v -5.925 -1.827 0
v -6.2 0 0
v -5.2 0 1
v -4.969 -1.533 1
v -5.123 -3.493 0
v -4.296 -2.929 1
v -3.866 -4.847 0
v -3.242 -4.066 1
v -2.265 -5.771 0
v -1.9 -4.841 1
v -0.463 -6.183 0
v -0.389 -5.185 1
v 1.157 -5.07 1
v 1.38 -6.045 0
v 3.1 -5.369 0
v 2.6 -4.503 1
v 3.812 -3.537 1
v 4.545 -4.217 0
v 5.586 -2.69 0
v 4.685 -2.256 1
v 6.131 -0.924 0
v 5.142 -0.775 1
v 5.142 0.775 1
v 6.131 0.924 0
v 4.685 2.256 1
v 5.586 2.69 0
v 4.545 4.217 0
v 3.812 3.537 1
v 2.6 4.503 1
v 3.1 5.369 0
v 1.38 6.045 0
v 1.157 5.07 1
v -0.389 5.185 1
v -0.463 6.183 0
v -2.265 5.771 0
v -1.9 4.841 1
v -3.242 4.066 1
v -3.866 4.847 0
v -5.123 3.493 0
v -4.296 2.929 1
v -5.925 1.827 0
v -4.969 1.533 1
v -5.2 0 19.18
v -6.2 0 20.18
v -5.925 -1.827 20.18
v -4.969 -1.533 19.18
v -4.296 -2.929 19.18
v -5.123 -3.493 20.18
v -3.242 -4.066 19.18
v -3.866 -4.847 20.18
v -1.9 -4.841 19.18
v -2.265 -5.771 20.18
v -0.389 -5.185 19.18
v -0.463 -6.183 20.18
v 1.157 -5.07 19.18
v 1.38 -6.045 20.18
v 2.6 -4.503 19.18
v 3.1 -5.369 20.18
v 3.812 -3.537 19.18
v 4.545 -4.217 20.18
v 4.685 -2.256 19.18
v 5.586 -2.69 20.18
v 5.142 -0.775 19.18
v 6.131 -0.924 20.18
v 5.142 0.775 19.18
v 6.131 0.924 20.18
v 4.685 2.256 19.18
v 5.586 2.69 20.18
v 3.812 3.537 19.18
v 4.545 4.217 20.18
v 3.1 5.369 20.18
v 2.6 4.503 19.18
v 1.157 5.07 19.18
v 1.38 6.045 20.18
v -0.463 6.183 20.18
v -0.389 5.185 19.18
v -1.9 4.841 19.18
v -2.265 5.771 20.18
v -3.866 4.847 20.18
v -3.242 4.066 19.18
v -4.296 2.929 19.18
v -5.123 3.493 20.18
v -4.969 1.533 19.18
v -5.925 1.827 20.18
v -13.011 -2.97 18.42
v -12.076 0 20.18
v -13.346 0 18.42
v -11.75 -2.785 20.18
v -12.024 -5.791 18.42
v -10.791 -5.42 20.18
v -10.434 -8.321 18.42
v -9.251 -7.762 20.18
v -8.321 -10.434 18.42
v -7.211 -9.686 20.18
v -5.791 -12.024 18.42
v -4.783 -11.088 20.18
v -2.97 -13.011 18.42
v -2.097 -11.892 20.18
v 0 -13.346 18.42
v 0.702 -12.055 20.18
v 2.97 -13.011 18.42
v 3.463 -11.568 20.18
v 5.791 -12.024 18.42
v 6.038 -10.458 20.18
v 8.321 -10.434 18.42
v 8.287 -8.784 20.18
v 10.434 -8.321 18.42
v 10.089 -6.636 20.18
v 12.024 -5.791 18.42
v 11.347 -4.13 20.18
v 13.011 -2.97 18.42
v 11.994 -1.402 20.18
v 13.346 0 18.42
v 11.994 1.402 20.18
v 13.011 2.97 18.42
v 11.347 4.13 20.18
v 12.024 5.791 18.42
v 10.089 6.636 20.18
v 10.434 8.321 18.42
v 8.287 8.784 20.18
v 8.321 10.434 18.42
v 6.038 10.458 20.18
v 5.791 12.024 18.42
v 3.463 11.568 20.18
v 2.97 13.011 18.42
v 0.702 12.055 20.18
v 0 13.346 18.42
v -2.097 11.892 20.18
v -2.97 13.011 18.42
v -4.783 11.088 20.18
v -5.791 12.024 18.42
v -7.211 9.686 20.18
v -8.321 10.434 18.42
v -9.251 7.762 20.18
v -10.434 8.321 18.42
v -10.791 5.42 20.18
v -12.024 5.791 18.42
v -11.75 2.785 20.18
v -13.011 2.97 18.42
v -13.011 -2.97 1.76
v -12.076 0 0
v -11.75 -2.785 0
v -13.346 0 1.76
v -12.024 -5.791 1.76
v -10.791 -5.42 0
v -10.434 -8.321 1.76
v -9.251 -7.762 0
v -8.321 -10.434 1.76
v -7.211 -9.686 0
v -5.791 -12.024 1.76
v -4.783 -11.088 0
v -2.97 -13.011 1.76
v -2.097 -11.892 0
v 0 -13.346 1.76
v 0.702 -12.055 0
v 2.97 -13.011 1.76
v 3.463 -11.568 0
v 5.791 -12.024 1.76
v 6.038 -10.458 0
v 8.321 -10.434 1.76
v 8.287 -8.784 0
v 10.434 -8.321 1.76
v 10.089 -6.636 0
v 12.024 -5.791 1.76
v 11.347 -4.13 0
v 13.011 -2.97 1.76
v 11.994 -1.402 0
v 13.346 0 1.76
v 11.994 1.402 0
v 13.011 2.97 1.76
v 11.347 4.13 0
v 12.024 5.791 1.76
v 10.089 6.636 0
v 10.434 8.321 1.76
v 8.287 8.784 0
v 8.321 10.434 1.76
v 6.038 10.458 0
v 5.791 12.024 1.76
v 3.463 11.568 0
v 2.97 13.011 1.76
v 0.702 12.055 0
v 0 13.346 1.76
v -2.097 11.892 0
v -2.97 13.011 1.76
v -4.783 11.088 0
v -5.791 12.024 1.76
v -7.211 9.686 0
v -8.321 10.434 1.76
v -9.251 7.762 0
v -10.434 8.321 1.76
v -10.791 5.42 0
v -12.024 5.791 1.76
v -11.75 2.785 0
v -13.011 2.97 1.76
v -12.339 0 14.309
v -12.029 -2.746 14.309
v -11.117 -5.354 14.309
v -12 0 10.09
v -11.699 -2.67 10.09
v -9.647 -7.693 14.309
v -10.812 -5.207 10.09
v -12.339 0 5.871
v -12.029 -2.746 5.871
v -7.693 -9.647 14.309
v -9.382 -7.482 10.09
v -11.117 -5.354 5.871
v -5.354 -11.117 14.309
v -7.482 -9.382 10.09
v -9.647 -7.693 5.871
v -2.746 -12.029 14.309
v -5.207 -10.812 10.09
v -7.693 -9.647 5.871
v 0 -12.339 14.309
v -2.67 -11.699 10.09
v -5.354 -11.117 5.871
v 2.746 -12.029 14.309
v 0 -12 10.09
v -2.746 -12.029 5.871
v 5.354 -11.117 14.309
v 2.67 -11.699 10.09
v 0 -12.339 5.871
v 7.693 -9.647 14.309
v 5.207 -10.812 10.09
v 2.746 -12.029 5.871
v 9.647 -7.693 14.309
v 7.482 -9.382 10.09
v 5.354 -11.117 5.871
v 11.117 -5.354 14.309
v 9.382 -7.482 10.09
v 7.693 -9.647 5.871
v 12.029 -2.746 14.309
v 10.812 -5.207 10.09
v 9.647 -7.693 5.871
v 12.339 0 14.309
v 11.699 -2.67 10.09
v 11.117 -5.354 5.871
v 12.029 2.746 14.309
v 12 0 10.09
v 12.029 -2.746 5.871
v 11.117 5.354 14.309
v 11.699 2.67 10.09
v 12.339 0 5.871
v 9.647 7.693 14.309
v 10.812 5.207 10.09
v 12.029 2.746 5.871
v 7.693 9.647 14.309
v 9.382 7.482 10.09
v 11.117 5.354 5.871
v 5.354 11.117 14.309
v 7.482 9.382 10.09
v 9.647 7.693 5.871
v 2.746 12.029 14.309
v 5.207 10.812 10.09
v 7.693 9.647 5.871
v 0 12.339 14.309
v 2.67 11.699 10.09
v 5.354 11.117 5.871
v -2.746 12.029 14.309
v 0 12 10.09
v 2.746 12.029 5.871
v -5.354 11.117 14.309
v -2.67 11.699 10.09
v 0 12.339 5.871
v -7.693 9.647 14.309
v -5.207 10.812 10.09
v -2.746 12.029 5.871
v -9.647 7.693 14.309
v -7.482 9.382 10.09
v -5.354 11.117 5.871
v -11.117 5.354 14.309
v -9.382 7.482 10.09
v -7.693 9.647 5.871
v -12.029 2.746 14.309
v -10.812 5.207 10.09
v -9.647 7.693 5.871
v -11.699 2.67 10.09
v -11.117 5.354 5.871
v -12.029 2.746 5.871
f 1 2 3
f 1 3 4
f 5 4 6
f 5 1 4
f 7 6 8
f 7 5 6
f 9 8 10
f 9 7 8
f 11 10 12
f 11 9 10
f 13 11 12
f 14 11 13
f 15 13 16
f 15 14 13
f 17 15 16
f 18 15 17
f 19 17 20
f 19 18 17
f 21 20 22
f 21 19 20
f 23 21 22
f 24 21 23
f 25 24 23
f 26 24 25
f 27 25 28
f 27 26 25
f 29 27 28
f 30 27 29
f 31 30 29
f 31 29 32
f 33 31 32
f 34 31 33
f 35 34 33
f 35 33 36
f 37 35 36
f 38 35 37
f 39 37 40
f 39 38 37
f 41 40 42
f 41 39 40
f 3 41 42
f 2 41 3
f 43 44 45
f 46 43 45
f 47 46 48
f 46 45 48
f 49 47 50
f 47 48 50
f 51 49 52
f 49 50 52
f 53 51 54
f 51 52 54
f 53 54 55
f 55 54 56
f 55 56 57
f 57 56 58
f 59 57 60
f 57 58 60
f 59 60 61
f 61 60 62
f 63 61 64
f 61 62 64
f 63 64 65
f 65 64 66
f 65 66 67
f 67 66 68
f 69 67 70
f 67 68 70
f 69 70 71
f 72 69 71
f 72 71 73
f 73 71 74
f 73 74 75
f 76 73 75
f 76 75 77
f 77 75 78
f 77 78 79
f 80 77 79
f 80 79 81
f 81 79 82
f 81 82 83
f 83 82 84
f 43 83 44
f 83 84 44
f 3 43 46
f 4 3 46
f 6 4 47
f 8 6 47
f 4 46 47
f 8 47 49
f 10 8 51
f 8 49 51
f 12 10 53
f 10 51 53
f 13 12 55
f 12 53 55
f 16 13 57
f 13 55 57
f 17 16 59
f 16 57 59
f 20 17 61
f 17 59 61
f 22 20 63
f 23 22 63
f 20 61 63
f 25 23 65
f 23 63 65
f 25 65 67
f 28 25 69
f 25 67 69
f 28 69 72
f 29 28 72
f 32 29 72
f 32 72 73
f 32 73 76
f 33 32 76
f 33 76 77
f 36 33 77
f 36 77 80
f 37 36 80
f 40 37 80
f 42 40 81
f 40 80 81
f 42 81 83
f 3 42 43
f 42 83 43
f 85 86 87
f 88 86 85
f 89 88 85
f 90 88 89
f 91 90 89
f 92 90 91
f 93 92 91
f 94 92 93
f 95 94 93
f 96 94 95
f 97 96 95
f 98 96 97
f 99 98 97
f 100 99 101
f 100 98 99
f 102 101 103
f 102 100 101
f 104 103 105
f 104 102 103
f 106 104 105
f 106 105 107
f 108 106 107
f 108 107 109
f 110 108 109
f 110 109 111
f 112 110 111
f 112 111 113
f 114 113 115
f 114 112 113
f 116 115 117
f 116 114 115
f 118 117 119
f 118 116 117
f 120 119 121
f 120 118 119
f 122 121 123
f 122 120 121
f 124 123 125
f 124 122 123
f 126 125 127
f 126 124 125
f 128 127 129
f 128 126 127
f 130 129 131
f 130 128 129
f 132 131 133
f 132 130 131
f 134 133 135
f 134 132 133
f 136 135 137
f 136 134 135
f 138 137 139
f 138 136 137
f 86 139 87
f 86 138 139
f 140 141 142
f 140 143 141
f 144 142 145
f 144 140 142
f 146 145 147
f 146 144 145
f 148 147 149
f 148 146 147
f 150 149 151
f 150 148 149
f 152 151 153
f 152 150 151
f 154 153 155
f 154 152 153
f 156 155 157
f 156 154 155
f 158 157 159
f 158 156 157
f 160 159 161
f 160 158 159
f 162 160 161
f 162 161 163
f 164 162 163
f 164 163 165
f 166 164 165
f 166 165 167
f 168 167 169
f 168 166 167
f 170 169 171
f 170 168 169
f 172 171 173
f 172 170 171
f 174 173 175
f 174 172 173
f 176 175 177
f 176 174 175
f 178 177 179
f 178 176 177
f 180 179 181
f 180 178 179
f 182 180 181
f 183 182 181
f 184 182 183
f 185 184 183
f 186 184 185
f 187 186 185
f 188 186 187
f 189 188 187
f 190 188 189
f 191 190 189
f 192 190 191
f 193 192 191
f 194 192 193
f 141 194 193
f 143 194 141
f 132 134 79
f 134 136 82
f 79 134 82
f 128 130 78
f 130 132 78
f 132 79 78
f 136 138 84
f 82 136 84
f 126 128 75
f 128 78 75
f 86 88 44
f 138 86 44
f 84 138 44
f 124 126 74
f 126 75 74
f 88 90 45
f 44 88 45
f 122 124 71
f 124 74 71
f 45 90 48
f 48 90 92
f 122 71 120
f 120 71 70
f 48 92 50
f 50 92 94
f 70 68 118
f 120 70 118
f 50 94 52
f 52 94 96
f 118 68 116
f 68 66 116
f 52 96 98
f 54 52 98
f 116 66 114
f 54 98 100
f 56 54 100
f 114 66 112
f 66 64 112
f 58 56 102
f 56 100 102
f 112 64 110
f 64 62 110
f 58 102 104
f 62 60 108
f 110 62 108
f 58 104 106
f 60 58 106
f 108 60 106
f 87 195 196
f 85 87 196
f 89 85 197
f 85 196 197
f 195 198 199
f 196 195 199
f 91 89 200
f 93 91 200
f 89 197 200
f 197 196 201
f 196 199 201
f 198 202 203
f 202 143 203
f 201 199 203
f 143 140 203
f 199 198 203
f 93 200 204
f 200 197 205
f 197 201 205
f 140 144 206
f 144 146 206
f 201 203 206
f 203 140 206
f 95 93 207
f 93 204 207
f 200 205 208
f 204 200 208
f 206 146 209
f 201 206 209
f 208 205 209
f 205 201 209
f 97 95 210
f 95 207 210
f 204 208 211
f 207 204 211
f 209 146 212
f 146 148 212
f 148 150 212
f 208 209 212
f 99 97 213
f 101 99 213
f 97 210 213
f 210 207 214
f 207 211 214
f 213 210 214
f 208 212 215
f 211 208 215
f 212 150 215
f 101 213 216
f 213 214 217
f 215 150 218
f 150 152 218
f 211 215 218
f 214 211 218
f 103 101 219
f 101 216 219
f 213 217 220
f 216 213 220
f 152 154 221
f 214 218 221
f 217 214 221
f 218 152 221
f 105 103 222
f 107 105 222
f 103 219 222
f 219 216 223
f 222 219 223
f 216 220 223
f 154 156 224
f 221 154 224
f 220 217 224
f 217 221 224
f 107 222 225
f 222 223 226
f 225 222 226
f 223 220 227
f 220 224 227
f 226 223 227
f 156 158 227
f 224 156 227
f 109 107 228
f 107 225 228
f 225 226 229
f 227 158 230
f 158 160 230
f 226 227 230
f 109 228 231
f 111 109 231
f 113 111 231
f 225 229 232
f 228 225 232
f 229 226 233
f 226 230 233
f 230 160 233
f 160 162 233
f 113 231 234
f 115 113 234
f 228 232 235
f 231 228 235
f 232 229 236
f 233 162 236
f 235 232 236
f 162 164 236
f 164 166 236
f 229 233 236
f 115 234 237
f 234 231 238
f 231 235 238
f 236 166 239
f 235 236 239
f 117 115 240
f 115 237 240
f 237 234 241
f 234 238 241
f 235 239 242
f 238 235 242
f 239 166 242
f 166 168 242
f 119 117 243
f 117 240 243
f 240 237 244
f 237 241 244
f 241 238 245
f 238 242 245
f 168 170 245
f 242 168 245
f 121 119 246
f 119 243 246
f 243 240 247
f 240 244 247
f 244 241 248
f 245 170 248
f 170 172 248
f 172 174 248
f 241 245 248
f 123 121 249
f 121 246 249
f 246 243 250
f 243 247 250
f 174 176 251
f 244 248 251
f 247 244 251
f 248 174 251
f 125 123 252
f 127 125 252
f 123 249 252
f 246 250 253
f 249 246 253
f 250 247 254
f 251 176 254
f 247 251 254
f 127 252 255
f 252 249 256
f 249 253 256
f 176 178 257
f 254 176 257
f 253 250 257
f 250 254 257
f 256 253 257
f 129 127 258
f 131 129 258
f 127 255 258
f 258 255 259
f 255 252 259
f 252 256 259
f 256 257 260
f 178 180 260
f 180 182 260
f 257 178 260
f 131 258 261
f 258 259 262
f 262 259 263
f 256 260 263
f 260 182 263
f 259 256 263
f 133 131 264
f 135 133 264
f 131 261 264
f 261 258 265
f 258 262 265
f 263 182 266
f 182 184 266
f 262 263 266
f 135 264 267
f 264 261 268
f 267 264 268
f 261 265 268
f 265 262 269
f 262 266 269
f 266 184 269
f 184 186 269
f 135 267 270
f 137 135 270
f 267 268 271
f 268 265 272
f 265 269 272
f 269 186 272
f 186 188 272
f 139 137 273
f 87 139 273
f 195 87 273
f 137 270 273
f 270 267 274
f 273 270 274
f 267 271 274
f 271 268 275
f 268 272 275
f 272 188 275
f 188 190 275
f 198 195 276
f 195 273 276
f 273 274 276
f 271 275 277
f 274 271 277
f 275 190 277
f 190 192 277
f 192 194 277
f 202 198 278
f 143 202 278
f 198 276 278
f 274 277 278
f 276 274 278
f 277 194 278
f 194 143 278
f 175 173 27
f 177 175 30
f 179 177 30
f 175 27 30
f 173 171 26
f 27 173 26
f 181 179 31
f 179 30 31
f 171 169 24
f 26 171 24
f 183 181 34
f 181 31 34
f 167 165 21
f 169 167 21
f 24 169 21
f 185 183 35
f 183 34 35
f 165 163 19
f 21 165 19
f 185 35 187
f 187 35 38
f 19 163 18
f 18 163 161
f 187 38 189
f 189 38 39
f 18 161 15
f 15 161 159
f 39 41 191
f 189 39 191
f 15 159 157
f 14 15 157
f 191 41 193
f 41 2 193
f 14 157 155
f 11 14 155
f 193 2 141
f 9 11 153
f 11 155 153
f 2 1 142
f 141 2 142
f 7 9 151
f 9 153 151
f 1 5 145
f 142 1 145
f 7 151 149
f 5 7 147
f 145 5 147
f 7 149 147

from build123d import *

# Parameters (mm, degrees)
F2_SIZE = 1


# Not quite as in the source:
# - a fillet or chamfer that OpenCascade refuses, or shapes differently, is made with other operations: its cross-section is extruded or revolved along the edge and cut away or added


with BuildPart() as f1:
    # F0 (on Front) → F1 (revolve)
    with BuildSketch(Plane.XZ):
        with BuildLine():
            Line((-5.2, 0), (-5.2, 20.18))
            Line((-5.2, 20.18), (-14, 20.18))
            ThreePointArc((-14, 20.18), (-12, 10.09), (-14, 0))
            Line((-14, 0), (-5.2, 0))
        make_face()
    revolve(axis=Axis((0, 0, 10.09), (0, 0, 1)))

    # F2
    f2_edges = [f1.edges().sort_by_distance(p)[0] for p in [
        (5.2, 0, 0),
        (5.2, 0, 20.18),
        (-5.2, 0, 10.09),
    ]]
    chamfer(f2_edges, length=F2_SIZE)

    # F3: chamfer of 2 on 3 edges, made by hand

    # F3_s1 → F3_t2 (revolve, cut)
    with BuildSketch(Plane.XZ):
        with BuildLine():
            Line((-13.3927401151, 18.3553817289), (-12.0288953822, 20.2448671044))
            Line((-12.0288953822, 20.2448671044), (-12.0288953822, 20.2848671044))
            ThreePointArc((-12.0288953822, 20.2848671044), (-13.0144476911, 20.22), (-14, 20.22))
            Line((-14, 20.22), (-14.0369756569, 20.1647421889))
            ThreePointArc((-14.0369756569, 20.1647421889), (-13.6870919943, 19.2711305309), (-13.4307048554, 18.3427849635))
            Line((-13.4307048554, 18.3427849635), (-13.3927401151, 18.3553817289))
        make_face()
    revolve(axis=Axis((0, 0, 20.18), (0, 0, 1)), mode=Mode.SUBTRACT)

    # F3_s3 → F3_t4 (revolve, cut)
    with BuildSketch(Plane.XZ):
        with BuildLine():
            Line((-12.0288953822, -0.0648671044), (-13.3927401151, 1.8246182711))
            Line((-13.3927401151, 1.8246182711), (-13.4307048554, 1.8372150365))
            ThreePointArc((-13.4307048554, 1.8372150365), (-13.6870919943, 0.9088694691), (-14.0369756569, 0.0152578111))
            Line((-14.0369756569, 0.0152578111), (-14, -0.04))
            ThreePointArc((-14, -0.04), (-13.0144476911, -0.04), (-12.0288953822, -0.1048671044))
            Line((-12.0288953822, -0.1048671044), (-12.0288953822, -0.0648671044))
        make_face()
    revolve(axis=Axis((0, 0, 0), (0, 0, 1)), mode=Mode.SUBTRACT)


solid = f1.part
